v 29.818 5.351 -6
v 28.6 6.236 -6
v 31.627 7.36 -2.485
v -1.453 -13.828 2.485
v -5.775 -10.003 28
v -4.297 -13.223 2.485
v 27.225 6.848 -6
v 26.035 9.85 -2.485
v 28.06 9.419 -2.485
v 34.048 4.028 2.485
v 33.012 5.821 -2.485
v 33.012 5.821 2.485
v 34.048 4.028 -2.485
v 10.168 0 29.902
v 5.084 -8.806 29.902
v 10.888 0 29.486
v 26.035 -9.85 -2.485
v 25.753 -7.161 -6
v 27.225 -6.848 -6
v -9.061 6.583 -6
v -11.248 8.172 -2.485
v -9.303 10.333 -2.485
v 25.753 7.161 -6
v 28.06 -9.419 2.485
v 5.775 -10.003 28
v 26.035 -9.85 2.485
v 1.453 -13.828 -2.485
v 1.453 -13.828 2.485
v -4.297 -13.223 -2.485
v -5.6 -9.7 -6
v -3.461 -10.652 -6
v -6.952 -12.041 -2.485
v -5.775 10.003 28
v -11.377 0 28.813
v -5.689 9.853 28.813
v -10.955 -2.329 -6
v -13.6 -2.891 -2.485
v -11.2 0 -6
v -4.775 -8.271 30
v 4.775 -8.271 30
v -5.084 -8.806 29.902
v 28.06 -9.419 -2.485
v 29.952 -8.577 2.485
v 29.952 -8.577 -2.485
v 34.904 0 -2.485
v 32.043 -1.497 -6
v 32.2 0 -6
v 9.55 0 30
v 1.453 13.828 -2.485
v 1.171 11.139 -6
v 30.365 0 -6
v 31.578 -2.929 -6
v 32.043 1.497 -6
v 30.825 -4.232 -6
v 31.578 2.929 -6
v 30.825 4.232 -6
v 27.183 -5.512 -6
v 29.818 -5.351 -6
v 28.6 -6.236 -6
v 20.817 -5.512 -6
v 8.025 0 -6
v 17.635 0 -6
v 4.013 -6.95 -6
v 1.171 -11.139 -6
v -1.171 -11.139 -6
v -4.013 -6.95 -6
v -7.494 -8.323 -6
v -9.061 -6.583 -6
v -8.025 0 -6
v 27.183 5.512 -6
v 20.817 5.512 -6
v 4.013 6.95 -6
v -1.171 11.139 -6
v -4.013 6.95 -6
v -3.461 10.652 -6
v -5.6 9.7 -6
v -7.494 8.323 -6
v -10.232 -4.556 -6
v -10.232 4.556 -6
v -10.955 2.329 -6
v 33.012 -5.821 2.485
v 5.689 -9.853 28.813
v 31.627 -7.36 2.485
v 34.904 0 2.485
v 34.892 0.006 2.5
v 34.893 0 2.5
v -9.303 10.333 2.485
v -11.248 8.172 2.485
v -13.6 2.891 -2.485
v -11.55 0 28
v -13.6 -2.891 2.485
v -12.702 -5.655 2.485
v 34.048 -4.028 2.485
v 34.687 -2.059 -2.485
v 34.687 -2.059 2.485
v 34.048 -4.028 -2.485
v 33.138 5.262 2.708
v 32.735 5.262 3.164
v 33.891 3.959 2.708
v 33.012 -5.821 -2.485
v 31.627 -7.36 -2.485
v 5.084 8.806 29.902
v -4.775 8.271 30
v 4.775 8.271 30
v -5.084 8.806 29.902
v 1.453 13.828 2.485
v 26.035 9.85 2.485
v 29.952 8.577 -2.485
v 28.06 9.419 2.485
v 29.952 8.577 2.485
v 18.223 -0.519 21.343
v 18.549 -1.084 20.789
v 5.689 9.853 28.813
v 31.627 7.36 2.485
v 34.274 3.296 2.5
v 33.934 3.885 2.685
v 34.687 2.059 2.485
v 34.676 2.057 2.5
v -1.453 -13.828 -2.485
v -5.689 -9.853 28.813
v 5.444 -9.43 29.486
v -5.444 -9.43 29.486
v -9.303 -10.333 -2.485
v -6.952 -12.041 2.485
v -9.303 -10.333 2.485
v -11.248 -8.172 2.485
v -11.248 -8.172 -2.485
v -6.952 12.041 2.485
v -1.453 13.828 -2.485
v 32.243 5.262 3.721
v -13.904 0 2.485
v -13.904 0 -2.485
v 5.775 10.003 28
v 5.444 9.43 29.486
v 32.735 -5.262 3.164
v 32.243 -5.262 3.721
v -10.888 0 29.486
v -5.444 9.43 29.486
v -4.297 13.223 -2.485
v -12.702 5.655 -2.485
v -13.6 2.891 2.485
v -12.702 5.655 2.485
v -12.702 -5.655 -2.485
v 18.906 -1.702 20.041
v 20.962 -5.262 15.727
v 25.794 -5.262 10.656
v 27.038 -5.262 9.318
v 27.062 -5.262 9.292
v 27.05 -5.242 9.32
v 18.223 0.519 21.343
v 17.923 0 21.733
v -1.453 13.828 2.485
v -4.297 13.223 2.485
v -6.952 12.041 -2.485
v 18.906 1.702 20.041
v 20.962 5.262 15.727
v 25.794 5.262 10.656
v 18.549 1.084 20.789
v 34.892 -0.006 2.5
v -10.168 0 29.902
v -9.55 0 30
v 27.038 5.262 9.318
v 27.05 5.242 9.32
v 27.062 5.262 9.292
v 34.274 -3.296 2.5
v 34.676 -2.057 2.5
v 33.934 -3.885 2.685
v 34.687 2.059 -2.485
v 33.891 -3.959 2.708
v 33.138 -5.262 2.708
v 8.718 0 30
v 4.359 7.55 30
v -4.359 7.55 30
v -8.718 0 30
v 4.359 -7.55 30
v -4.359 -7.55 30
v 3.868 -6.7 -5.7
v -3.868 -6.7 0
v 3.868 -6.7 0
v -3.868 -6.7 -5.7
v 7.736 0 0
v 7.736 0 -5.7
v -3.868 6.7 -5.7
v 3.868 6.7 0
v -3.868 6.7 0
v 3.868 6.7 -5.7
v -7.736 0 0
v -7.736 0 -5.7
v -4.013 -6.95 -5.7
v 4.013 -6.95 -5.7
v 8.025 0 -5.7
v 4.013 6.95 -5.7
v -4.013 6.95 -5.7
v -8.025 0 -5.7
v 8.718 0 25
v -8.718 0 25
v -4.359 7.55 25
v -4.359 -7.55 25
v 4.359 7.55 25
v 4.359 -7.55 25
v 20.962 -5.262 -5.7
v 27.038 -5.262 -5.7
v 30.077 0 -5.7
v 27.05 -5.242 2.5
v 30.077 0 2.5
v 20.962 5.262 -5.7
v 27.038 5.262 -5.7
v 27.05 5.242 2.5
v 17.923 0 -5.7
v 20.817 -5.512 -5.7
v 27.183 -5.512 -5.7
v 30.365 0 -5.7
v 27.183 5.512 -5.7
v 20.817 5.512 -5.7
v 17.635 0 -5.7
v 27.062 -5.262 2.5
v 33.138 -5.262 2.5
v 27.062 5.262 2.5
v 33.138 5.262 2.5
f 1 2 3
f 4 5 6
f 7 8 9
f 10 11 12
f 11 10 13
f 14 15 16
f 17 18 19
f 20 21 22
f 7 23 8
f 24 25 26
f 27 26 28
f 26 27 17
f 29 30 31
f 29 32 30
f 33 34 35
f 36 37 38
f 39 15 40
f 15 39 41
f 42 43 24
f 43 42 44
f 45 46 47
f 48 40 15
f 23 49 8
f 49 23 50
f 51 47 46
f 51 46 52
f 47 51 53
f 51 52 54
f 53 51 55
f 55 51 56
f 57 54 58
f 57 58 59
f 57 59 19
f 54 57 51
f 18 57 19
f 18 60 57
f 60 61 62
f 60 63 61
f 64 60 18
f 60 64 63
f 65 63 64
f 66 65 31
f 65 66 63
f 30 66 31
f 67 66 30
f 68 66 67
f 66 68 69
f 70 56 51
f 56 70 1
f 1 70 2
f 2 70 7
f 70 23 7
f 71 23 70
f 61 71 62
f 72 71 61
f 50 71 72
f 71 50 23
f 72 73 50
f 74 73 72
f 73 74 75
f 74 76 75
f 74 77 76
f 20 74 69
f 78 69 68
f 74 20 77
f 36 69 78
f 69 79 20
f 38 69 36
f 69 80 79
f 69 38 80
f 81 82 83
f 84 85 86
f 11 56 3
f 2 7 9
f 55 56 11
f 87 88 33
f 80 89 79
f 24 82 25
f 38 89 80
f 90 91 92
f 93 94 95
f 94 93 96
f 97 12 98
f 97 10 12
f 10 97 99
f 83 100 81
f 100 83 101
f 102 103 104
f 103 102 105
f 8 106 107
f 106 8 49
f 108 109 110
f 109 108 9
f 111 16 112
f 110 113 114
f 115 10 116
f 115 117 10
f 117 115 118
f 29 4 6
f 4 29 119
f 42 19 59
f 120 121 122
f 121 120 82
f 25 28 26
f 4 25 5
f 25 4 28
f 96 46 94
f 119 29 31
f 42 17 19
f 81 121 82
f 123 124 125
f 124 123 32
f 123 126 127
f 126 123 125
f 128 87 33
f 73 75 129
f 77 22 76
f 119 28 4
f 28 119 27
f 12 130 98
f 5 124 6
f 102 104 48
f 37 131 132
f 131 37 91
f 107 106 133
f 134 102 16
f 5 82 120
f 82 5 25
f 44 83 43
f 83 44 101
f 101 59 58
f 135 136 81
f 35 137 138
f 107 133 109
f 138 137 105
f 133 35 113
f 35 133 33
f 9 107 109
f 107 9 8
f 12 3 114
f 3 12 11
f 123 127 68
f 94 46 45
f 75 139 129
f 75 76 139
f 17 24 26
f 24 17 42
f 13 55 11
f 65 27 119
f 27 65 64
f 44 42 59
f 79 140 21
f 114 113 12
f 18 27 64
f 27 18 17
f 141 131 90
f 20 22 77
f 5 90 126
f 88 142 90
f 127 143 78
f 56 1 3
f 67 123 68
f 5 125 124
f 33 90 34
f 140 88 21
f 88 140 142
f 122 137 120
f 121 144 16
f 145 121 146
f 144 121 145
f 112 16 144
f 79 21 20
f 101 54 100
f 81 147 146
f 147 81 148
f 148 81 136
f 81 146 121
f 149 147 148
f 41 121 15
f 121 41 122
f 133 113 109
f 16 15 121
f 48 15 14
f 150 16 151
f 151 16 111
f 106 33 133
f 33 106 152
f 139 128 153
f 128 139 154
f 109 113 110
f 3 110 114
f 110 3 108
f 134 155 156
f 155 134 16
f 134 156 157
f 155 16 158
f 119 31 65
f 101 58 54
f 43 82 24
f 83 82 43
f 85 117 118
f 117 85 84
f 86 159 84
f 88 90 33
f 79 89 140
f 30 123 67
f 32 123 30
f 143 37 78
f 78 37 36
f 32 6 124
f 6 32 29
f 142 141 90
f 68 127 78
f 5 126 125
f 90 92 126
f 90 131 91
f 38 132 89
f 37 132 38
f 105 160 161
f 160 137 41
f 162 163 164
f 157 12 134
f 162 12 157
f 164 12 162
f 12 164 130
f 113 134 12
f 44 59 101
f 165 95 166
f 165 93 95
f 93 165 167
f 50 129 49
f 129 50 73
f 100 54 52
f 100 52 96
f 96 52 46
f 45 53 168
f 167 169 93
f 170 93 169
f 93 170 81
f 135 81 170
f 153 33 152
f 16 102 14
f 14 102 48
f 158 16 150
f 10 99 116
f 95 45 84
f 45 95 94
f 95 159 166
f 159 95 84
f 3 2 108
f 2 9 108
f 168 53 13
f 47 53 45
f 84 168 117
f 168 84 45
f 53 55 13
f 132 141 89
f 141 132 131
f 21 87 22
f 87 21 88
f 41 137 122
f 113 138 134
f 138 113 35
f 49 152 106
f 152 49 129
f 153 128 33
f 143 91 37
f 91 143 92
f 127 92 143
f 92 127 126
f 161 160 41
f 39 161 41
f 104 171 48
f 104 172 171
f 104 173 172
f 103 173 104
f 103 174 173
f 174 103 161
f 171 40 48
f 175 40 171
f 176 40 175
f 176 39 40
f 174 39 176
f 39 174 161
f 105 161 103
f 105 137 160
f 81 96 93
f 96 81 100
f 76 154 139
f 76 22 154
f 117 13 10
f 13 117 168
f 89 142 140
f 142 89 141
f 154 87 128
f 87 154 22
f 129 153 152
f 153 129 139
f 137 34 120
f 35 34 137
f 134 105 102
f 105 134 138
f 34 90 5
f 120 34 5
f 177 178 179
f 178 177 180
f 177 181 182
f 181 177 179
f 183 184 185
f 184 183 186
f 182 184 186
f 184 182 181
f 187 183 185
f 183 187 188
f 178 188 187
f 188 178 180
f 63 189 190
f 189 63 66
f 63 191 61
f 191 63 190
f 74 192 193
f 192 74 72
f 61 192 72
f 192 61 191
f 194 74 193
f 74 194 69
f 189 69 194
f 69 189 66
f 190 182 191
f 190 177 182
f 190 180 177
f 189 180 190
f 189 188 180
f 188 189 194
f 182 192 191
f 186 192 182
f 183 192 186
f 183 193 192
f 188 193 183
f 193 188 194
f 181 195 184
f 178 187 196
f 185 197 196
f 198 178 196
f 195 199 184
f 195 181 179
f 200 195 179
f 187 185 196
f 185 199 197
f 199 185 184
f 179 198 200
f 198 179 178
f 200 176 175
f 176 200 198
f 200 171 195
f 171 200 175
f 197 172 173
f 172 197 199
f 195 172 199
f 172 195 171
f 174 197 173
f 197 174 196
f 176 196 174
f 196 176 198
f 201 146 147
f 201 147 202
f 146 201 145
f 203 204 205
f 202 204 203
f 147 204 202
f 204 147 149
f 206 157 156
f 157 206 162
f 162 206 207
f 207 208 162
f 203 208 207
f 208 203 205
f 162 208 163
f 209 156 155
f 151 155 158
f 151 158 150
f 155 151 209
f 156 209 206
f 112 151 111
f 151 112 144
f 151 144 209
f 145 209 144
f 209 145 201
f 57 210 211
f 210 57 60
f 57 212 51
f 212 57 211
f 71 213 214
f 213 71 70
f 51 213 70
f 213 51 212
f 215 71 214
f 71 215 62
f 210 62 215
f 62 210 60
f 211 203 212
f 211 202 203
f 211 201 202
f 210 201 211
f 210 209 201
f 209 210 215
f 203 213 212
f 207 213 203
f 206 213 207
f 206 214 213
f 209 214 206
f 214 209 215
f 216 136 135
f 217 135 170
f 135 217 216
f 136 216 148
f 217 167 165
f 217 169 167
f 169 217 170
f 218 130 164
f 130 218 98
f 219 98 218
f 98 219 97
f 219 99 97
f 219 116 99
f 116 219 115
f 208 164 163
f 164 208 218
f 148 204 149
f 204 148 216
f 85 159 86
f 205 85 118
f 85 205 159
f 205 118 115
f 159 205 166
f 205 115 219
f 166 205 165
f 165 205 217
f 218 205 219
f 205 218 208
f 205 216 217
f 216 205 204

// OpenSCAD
module hex(d, h, d1, d2) {
    cylinder(d1 = (d1 ? d1 : d)/cos(180/6), d2 = (d2 ? d2 : d)/cos(180/6), h=h, center=true, $fn=6);
}

smallHexD = 13.4;
largeHexD = 15.1;

module cyl(d=28, fillIn = true) {
    factor = 1.3;
    rotate([0,0,0]) {
        rotate_extrude() translate([d/2 - (6.125/factor),0,0]) scale([1,factor,1]) rotate([0,0,22.5]) circle(d=12/factor/cos(180/8), $fn=8);
        if (fillIn) {
            cylinder(d=d-8, h=12, center=true);
        }
    }
}
// flat handle version
difference() {
    union() {
        hull() {
            cyl();
            translate([25,0,0]) cyl(d=20, fillIn=false);
            translate([0,0,30 - 2]) {
                translate([0,0,0]) rotate_extrude($fn=6) translate([(largeHexD + 8)/2 - 2,0,0])  circle(d=4, $fn=15);
                cylinder(d=largeHexD+4, h=4, center=true, $fn=6);
            }
        }
    }
    translate([0,0, -10]) hex(d=smallHexD, h=20);
    // ease the bottom layer
    translate([0,0, -6]) hex(d=smallHexD+0.5, h=0.6);
    translate([0,0, (30 - 5)/2]) hex(d1=smallHexD, d2=largeHexD, h=30 - 5);
    translate([0,0, 28]) hex(largeHexD, h=6);
    translate([24,0, 0]) hex(d=1 + 3/8 * 25.4, h=50);
    // ease the bottom layer
    translate([24,0, -6]) hex(d=1.5 + 3/8 * 25.4, h=0.6);
    translate([30.1,0, 8.5]) hex(d=1 + 3/8 * 25.4, h=12);
}

/* alternate tall version */
height = 25;
lobes = 2;
*intersection() {
    difference() {
            union() {
                translate([0,0,-(height)/2]) cylinder(d1=(smallHexD+7), d2=40, center=true, h=height, $fn=60);
                translate([0,0,(height)/2]) cylinder(d2=(largeHexD+7), d1=40, center=true, h=height, $fn=60);
            }
        translate([0,0,-height+3]) hex(d=smallHexD, h=8);
        // ease the bottom layer
        translate([0,0, -height]) hex(d=smallHexD+0.5, h=0.6);
        translate([0,0,height-3]) hex(d=largeHexD, h=8);
        hex(d1=smallHexD, d2=largeHexD, h=height*2 - 14);
    }
    union() {
        for (i=[1:lobes]) {
            rotate([0,0,i*360/lobes])
                hull() {
                    translate([(35 - 12)/2, 0, 0])
                        cylinder(d=12, h=height*2, center=true);
                    cylinder(d1=(smallHexD+7), d2=(largeHexD+7), h=height*2, center=true);
                }
        }
    }
}
